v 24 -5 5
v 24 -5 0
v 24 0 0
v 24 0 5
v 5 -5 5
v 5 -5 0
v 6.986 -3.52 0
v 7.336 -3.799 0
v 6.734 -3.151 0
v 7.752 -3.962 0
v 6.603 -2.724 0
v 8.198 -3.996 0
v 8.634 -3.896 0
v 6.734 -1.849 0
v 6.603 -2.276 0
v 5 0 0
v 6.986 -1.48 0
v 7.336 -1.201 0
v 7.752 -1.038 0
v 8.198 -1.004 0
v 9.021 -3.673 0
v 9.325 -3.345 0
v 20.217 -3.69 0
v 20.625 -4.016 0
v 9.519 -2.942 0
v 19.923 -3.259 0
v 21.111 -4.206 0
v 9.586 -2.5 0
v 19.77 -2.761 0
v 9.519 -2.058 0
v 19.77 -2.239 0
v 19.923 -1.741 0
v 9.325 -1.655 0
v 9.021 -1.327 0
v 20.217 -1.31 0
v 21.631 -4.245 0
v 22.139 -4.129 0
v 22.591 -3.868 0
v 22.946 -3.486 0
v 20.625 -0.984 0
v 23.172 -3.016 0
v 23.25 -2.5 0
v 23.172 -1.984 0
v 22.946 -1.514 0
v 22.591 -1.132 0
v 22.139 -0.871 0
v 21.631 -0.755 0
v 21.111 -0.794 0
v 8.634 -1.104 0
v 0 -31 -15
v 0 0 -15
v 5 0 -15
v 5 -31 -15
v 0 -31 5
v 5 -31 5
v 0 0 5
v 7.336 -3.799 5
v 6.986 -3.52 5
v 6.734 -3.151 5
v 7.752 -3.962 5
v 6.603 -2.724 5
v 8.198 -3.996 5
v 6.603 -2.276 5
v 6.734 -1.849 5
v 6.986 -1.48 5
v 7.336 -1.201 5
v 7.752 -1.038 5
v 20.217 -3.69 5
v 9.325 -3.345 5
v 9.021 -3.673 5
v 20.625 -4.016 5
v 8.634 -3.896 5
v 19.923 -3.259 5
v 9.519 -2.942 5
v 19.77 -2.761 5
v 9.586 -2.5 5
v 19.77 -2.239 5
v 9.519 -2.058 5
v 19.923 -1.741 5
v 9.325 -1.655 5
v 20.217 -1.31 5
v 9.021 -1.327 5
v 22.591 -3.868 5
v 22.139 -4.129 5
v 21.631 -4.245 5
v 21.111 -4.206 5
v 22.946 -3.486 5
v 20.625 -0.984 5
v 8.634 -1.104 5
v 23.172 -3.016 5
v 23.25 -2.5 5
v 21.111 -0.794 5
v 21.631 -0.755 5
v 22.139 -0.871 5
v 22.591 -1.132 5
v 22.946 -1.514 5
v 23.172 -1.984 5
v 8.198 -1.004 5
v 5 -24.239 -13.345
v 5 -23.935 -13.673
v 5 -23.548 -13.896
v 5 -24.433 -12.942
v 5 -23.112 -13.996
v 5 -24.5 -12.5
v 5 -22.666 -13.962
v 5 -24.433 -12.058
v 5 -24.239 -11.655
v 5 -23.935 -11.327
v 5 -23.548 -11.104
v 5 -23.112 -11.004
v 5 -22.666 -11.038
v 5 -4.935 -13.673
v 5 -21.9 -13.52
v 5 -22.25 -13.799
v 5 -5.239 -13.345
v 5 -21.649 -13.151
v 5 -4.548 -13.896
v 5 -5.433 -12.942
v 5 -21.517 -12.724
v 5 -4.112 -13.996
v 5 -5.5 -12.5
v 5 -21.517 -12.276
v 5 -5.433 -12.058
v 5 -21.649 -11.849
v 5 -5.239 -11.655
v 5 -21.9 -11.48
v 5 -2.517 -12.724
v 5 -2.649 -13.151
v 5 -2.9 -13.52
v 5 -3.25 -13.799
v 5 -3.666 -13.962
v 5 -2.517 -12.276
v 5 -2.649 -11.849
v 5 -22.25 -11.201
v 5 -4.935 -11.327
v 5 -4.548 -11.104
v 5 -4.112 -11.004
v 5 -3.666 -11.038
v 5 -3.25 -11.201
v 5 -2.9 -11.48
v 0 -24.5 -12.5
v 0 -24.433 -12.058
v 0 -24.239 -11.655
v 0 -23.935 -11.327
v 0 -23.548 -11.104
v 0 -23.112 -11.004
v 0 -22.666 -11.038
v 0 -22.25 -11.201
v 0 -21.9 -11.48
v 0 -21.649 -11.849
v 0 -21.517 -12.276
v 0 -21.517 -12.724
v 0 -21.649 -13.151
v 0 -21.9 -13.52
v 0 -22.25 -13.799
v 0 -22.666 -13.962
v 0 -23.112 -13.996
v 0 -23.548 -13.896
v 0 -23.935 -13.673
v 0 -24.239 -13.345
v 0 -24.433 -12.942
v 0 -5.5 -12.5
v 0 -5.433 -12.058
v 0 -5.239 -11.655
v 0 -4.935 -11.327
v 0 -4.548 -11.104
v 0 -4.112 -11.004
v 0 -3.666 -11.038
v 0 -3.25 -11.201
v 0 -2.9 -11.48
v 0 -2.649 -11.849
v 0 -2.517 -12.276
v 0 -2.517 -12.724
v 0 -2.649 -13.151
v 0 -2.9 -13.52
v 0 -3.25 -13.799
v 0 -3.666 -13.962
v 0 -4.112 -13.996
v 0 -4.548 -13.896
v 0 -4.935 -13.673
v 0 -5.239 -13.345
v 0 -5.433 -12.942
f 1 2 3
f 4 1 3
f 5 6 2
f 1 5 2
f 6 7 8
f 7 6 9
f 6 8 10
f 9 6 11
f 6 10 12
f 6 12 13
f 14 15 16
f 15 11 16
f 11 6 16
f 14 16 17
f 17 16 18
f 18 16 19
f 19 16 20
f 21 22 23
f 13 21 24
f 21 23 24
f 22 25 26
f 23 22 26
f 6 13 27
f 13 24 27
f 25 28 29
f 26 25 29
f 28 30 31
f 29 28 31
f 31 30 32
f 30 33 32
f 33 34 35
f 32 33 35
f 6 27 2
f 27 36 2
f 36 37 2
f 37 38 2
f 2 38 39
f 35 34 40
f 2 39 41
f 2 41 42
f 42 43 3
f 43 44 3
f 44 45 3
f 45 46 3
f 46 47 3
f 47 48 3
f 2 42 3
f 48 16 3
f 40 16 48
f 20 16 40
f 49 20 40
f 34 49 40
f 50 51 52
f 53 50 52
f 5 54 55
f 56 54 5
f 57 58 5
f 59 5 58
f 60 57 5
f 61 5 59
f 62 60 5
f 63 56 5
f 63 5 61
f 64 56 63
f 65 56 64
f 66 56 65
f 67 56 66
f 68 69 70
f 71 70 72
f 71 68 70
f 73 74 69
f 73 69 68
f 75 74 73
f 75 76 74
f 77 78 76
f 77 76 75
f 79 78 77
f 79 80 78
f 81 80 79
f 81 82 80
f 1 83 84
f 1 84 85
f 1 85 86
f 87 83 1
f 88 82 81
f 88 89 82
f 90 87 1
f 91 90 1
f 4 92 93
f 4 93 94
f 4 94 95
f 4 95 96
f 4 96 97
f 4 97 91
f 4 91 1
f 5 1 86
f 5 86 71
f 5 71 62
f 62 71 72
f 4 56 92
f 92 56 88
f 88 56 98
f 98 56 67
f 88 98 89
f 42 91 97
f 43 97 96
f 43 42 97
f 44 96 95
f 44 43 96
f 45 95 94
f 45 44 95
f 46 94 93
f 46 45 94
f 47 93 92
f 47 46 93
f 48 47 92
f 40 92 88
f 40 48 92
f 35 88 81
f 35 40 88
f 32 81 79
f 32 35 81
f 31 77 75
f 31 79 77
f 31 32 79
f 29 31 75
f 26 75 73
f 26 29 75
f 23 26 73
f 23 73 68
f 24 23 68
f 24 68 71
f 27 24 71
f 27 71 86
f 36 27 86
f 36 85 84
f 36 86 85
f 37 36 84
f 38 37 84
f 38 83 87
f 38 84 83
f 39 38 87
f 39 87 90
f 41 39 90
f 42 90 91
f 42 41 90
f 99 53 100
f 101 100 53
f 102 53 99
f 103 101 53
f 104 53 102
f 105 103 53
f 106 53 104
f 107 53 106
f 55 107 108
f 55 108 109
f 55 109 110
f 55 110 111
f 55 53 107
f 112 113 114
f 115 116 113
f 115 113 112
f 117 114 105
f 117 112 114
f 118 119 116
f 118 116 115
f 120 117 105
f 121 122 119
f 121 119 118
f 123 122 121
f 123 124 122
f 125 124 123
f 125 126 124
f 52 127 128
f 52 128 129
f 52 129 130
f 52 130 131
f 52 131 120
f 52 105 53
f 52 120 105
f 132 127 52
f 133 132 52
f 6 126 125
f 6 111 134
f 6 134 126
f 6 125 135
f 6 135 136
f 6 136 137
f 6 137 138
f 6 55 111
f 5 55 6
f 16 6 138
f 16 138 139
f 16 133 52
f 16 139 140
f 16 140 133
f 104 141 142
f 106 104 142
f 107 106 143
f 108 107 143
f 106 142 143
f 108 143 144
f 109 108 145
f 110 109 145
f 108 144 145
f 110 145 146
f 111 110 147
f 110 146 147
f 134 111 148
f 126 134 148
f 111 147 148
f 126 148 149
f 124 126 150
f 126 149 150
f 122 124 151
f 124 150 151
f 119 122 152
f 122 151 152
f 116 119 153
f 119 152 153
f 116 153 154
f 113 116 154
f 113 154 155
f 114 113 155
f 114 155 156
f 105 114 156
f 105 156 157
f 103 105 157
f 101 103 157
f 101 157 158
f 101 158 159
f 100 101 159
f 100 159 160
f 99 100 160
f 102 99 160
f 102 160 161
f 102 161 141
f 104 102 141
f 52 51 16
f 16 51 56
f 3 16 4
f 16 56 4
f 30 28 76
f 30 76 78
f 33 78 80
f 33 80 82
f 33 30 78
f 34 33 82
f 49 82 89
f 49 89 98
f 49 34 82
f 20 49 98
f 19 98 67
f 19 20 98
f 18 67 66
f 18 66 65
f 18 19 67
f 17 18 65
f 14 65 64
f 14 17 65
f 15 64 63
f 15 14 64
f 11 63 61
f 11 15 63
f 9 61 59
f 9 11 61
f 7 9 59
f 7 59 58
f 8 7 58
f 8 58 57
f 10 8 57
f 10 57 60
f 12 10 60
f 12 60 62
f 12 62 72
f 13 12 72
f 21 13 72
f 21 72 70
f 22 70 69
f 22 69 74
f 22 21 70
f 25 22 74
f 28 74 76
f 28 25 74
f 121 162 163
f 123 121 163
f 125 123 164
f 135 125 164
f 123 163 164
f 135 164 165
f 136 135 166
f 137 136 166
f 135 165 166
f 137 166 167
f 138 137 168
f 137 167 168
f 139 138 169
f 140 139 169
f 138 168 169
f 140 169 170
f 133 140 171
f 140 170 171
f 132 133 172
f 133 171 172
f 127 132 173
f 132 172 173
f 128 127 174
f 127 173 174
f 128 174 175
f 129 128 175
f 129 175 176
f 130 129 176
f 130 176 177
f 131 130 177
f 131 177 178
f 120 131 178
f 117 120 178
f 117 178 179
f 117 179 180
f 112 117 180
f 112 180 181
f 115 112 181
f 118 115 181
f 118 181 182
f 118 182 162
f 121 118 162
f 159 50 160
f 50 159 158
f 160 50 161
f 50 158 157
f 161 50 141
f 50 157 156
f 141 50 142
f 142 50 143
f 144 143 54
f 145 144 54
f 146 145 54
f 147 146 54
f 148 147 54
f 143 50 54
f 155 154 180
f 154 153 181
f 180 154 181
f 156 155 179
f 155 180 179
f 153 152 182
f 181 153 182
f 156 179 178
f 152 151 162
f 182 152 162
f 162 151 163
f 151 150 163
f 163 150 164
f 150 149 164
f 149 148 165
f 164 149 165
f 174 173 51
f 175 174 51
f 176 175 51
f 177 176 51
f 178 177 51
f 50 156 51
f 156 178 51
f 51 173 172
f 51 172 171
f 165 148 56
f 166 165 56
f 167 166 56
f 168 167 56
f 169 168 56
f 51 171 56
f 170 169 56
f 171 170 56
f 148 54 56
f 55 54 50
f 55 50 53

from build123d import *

# Parameters (mm, degrees)
F0_R     = 1.5
F1_DEPTH = 5
F2_R     = 1.75
F4_DEPTH = 7
F3_W     = 5
F3_H     = 31
F5_DEPTH = 20
F6_R     = 1.5
F7_DEPTH = 25


with BuildPart() as f1:
    # F0 (on Top) → F1 (new body)
    with BuildSketch(Plane.XY):
        Polygon((24, 0), (0, 0), (0, -31), (5, -31), (5, -5), (24, -5), align=None)
        with Locations((8.085881, -2.5)):
            Circle(F0_R, mode=Mode.SUBTRACT)
    extrude(amount=F1_DEPTH)

    # F2 (on Top) → F4 (cut)
    with BuildSketch(Plane.XY):
        with Locations((21.5, -2.5)):
            Circle(F2_R)
    extrude(amount=F4_DEPTH, mode=Mode.SUBTRACT)

    # F3 (on face) → F5 (join)
    with BuildSketch(Plane.XY.offset(5)):
        with Locations((2.5, -15.5)):
            Rectangle(F3_W, F3_H)
    extrude(amount=-F5_DEPTH)

    # F6 (on face) → F7 (cut)
    with BuildSketch(Plane(origin=(0, 0, 0), x_dir=(0, -1, 0), z_dir=(-1, 0, 0))):
        with Locations((23, -12.5)):
            Circle(F6_R)
        with Locations((4, -12.5)):
            Circle(F6_R)
    extrude(amount=-F7_DEPTH, mode=Mode.SUBTRACT)


solid = f1.part
